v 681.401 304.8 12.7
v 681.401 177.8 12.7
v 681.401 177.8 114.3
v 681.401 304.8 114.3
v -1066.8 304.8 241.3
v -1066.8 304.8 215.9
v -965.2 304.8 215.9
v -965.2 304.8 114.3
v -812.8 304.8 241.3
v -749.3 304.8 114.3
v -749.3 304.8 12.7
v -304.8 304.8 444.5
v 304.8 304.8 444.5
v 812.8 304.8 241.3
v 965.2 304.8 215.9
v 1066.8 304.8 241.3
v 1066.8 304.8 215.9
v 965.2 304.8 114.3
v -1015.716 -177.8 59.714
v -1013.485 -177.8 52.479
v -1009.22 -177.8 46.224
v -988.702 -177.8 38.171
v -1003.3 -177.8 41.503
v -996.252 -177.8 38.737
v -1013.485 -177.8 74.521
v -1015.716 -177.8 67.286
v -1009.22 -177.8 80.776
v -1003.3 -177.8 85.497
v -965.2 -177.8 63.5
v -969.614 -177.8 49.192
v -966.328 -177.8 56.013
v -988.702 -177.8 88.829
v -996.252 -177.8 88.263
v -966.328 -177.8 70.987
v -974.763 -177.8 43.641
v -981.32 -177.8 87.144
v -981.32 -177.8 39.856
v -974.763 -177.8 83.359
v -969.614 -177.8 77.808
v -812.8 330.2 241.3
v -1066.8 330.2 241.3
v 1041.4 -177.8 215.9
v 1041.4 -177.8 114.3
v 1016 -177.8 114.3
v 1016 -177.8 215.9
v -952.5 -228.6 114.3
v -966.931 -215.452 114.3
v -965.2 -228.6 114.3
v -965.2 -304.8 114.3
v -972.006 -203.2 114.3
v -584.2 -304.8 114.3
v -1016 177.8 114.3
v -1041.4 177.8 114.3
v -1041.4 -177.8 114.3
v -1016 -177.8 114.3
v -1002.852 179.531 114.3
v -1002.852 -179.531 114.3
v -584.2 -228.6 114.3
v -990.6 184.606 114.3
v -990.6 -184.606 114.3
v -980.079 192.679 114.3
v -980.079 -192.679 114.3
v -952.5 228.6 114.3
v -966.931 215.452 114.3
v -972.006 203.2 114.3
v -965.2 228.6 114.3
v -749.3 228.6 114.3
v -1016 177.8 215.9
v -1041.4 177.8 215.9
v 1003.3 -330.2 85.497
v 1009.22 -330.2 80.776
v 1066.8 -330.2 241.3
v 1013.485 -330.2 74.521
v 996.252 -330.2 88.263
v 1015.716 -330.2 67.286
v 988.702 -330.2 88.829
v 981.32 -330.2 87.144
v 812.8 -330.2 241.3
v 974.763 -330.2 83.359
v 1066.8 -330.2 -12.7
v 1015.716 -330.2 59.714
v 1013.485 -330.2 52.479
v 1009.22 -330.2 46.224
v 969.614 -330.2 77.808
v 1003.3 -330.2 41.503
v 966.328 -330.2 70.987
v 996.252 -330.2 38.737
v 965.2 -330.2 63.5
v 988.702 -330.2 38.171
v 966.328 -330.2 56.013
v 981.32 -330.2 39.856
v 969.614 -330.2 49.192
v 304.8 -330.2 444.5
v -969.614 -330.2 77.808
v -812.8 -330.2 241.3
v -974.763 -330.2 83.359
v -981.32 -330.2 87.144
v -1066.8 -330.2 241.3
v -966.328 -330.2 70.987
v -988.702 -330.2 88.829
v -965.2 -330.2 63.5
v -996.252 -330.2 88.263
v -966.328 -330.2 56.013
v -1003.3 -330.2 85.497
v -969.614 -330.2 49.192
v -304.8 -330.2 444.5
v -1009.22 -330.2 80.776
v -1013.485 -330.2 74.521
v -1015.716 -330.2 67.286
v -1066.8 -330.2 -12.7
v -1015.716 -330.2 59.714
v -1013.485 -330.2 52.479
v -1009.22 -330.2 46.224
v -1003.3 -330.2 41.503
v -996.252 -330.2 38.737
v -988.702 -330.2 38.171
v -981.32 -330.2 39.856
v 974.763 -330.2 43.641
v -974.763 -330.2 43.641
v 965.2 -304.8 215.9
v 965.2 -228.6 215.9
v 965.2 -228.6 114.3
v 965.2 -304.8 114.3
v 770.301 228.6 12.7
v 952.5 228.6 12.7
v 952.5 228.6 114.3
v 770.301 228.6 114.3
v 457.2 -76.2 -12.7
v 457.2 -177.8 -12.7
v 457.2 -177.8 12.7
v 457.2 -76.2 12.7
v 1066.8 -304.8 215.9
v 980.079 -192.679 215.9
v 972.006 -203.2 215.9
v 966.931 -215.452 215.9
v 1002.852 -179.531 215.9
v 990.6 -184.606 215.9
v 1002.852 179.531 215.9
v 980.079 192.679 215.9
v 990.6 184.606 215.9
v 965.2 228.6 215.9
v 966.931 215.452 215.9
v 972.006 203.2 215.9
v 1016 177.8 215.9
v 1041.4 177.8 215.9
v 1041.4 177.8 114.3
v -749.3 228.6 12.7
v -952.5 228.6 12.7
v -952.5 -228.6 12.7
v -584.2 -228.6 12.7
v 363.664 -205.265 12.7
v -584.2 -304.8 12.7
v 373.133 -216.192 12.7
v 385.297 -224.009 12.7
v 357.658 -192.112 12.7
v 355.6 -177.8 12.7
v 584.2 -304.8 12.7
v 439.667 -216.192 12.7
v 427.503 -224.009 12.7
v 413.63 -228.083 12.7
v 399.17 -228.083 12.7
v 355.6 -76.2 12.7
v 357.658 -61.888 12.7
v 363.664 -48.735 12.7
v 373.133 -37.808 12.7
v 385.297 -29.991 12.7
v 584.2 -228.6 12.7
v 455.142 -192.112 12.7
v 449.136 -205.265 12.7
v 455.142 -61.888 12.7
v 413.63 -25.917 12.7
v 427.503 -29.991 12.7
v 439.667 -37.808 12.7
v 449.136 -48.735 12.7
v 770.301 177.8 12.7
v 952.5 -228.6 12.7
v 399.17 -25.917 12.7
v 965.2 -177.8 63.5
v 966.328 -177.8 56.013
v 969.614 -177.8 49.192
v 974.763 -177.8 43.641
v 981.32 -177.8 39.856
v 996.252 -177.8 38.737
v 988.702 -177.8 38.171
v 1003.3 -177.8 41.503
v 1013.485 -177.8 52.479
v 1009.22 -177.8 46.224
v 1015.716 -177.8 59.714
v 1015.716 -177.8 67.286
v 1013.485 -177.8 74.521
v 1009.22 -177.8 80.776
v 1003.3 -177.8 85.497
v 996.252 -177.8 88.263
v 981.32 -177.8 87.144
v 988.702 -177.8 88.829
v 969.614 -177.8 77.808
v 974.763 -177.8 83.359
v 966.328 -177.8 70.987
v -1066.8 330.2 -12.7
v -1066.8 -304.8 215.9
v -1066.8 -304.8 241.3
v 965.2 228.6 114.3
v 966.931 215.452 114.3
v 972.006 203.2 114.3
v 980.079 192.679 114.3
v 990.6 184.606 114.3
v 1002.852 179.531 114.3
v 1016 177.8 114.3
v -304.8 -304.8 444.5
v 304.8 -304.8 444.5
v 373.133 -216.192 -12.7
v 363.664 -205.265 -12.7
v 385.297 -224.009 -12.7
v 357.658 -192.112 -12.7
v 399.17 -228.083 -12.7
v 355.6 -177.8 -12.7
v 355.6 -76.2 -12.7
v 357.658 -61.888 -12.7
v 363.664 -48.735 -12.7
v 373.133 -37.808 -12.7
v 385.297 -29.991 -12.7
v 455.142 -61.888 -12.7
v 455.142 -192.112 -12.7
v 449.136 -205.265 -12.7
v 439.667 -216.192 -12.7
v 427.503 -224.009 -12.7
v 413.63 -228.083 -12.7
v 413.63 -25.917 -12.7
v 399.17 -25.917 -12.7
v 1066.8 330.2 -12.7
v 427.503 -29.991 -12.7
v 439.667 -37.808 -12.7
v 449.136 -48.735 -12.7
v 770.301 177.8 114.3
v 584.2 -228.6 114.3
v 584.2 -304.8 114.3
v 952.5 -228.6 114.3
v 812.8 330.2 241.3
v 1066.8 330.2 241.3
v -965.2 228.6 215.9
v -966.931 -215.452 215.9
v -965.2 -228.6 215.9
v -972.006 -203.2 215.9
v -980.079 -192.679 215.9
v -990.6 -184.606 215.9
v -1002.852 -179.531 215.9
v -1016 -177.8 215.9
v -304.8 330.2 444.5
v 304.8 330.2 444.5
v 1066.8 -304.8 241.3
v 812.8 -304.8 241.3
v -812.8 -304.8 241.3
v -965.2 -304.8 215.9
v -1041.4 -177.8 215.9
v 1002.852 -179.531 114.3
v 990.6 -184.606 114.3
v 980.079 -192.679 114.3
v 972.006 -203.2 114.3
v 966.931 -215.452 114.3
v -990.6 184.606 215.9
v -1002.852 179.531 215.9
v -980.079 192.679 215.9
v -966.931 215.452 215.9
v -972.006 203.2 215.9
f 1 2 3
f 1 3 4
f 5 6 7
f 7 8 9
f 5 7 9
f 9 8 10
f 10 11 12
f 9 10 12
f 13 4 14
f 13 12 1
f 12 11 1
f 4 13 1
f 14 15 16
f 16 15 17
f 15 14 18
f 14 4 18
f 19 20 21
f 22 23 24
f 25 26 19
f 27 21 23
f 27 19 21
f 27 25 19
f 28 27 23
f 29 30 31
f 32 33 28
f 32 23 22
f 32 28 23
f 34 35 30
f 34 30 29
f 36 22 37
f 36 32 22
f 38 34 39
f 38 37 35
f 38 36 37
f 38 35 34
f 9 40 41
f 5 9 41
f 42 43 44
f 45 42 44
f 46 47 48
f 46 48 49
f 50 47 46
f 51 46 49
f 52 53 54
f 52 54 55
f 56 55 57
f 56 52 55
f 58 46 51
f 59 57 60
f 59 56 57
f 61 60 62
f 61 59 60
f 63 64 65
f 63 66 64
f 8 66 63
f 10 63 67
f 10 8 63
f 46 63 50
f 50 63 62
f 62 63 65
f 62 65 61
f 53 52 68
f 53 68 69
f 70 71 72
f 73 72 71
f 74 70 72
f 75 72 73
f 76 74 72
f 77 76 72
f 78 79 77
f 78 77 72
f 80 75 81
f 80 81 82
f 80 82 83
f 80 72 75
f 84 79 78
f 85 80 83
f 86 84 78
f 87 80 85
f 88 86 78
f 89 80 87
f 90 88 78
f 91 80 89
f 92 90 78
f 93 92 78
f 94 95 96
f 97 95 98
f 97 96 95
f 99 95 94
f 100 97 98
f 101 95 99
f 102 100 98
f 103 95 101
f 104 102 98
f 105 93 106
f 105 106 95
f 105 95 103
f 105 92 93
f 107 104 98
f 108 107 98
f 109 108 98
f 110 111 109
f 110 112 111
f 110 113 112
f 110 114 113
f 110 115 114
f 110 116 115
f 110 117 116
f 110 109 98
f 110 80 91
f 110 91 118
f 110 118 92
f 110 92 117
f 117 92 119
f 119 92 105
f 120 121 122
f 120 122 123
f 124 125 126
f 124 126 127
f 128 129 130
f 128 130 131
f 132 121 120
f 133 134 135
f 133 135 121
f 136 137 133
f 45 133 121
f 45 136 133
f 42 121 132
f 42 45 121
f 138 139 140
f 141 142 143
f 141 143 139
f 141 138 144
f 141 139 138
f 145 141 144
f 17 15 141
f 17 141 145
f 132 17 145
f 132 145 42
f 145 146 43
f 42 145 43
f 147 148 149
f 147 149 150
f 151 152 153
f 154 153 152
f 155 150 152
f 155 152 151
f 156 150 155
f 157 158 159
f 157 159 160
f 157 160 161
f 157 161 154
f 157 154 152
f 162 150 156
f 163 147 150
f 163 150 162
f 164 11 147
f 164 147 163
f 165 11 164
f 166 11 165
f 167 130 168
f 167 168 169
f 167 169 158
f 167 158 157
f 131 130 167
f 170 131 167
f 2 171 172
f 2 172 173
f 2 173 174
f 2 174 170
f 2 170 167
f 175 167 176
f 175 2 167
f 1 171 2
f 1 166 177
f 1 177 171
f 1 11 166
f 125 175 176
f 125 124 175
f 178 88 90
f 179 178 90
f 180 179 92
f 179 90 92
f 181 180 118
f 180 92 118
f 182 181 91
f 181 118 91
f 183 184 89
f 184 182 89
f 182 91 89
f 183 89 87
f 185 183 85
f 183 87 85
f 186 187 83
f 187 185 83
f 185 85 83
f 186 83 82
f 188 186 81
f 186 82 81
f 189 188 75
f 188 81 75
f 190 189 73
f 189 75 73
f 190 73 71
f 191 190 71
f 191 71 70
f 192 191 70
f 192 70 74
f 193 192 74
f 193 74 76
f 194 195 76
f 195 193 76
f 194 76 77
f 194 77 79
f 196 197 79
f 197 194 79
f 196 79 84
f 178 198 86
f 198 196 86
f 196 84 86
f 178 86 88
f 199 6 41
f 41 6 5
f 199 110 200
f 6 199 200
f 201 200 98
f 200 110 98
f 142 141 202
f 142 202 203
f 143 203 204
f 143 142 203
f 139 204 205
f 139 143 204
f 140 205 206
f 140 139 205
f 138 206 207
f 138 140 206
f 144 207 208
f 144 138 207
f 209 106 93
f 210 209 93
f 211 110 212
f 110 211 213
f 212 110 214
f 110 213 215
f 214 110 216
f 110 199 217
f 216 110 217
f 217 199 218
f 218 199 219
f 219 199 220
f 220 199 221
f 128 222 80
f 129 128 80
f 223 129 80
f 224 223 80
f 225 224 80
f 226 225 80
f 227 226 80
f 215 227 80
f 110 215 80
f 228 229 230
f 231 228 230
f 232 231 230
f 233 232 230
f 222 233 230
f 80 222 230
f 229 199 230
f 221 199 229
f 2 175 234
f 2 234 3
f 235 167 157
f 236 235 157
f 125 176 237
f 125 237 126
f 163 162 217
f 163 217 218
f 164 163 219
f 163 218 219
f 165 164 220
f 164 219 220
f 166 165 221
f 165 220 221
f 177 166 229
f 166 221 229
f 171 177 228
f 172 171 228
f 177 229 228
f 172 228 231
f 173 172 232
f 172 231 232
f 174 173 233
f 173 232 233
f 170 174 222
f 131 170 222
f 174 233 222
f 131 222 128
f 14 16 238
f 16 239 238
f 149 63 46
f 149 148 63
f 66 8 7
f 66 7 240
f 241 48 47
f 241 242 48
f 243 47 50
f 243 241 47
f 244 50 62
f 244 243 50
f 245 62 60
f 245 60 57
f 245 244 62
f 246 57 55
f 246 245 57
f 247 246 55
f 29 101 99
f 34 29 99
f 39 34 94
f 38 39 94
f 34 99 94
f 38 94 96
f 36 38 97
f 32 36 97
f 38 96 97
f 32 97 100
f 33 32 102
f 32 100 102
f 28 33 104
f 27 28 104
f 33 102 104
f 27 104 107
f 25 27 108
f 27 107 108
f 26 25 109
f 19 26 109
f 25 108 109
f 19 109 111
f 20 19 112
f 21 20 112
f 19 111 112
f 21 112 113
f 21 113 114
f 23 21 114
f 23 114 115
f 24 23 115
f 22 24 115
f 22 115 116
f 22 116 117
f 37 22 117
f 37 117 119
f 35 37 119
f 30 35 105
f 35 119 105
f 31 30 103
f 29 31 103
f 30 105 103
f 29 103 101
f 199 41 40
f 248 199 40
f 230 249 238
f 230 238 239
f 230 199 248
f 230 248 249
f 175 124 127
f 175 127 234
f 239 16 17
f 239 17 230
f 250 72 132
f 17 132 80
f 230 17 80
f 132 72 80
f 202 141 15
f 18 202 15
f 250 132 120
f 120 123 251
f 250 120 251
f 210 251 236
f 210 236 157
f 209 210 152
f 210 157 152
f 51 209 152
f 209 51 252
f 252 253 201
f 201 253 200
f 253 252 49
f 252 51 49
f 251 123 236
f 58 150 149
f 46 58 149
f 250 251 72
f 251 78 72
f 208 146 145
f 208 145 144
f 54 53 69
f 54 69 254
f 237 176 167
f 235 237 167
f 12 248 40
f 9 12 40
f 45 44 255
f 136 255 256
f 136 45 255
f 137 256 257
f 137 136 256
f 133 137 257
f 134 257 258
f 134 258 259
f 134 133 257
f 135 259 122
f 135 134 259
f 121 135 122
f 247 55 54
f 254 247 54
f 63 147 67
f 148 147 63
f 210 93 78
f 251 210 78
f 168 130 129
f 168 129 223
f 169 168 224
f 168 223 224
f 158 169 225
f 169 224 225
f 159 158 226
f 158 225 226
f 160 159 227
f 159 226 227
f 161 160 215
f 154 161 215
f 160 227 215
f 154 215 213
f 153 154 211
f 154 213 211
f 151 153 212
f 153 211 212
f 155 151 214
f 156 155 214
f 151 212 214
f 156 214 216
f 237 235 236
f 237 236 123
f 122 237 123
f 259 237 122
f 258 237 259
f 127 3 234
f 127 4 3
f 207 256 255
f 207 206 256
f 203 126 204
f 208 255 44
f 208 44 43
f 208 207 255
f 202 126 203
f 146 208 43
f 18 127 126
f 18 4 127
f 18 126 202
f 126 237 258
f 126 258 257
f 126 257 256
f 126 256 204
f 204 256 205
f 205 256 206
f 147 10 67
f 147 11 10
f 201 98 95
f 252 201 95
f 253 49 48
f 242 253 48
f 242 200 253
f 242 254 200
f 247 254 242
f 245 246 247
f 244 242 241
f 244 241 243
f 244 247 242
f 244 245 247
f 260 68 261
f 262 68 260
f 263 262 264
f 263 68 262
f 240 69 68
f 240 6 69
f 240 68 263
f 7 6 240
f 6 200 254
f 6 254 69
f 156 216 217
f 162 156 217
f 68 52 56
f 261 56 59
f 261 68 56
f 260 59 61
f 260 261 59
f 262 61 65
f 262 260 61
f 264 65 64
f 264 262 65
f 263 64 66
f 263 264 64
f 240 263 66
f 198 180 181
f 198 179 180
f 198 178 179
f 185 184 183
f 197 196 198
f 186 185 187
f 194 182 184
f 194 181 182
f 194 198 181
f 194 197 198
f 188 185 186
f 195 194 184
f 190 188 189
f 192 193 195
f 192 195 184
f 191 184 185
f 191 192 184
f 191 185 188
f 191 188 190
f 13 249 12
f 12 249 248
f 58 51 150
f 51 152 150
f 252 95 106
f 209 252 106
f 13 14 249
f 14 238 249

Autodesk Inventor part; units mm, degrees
ref_plane "YZ Plane" through (0, 0, 0) normal (1, 0, 0) x (0, 1, 0)
ref_plane "XZ Plane" through (0, 0, 0) normal (0, 1, 0) x (-1, 0, 0)
ref_plane "XY Plane" through (0, 0, 0) normal (0, 0, 1) x (1, 0, 0)
sketch "Sketch1" plane through (0, 0, 0) normal (0, 0, 1) x (1, 0, 0)
  line L0 (-1066.8, 304.8) -> (1066.8, 304.8)
  line L1 (1066.8, 304.8) -> (1066.8, -304.8)
  line L2 (1066.8, -304.8) -> (-1066.8, -304.8)
  line L3 (-1066.8, -304.8) -> (-1066.8, 304.8)
  point P0 (0, 0)
  point P1 (1066.8, 0)
  point P2 (0, 304.8)
  dimension "d0" = 2133.6
  dimension "d1" = 609.6
extrude "Extrusion1" add sketch "Sketch1" along normal mid plane 25.4
sketch "Sketch3" plane through (0, 0, 12.7) normal (0, 0, 1) x (1, 0, 0)
  line L0 (-1066.8, -304.8) -> (-1066.8, 304.8) projected
  line L1 (1066.8, -304.8) -> (-1066.8, -304.8) projected
  line L2 (-1066.8, 304.8) -> (-1041.4, 304.8)
  line L3 (-1041.4, 304.8) -> (-1041.4, -304.8)
  line L4 (-1041.4, -304.8) -> (-1066.8, -304.8)
  line L5 (-1066.8, -304.8) -> (-1066.8, 304.8)
  line L6 (1066.8, 304.8) -> (1041.4, 304.8)
  line L7 (1041.4, 304.8) -> (1041.4, -304.8)
  line L8 (1041.4, -304.8) -> (1066.8, -304.8)
  line L9 (1066.8, -304.8) -> (1066.8, 304.8)
  point P0 (0, 0)
  dimension "d18" = 25.4
  dimension "d19" = 25.4
extrude "Extrusion3" add sketch "Sketch3" along normal blind 203.2
sketch "Sketch5" plane through (0, 0, 0) normal (0, 1, 0) x (-1, 0, 0)
  line L0 (-1041.4, 12.7) -> (1041.4, 12.7) projected
  point P0 (0, 0)
  point P1 (787.4, 12.7)
sketch "Sketch6" plane through (0, 0, 12.7) normal (0, 0, 1) x (1, 0, 0)
  line L0 (-1041.4, 304.8) -> (-1041.4, -304.8) projected
  line L1 (-1041.4, 304.8) -> (-965.2, 304.8)
  line L2 (-965.2, 304.8) -> (-965.2, 177.8)
  line L3 (-965.2, 177.8) -> (-1041.4, 177.8)
  line L4 (-1041.4, 177.8) -> (-1041.4, 304.8)
  line L5 (-1041.4, -304.8) -> (-965.2, -304.8)
  line L6 (-965.2, -304.8) -> (-965.2, -177.8)
  line L7 (-965.2, -177.8) -> (-1041.4, -177.8)
  line L8 (-1041.4, -177.8) -> (-1041.4, -304.8)
  point P0 (0, 0)
  dimension "d30" = 76.2
  dimension "d31" = 127
  dimension "d32" = 127
  dimension "d33" = 76.2
extrude "Extrusion5" add sketch "Sketch6" along normal blind 203.2
mirror "Mirror1" about plane through (0, 0, 0) normal (1, 0, 0) of "Extrusion5"
fillet "Fillet1" radius 50.8 4 edges at (-965.2, 177.8, 114.3) (965.2, 177.8, 114.3) (965.2, -177.8, 114.3) (-965.2, -177.8, 114.3)
sketch "Sketch14" plane through (0, 0, -12.7) normal (0, 0, -1) x (-1, 0, 0)
  line L0 (-1066.8, 304.8) -> (1066.8, 304.8)
  line L1 (1066.8, 304.8) -> (1066.8, 330.2)
  line L2 (1066.8, 330.2) -> (-1066.8, 330.2)
  line L3 (-1066.8, 330.2) -> (-1066.8, 304.8)
  line L4 (1066.8, -304.8) -> (-1066.8, -304.8)
  line L5 (-1066.8, -304.8) -> (-1066.8, -330.2)
  line L6 (-1066.8, -330.2) -> (1066.8, -330.2)
  line L7 (1066.8, -330.2) -> (1066.8, -304.8)
  point P0 (0, 0)
  dimension "d62" = 25.4
  dimension "d63" = 25.4
extrude "Extrusion11" add sketch "Sketch14" against normal blind 228.6
sketch "Sketch15" plane through (-1066.8, 330.2, -12.7) normal (0, 1, 0) x (1, 0, 0)
  line L0 (2133.6, 0) -> (2133.6, -228.6) projected
  line L1 (2133.6, -228.6) -> (2133.6, -254)
  line L2 (2133.6, -254) -> (1879.6, -254)
  line L3 (1879.6, -254) -> (1371.6, -457.2)
  line L4 (1371.6, -457.2) -> (762, -457.2)
  line L5 (762, -457.2) -> (254, -254)
  line L6 (254, -254) -> (0, -254)
  line L7 (0, -254) -> (0, -228.6)
  line L8 (0, -228.6) -> (2133.6, -228.6)
  point P0 (1066.8, -12.7)
  dimension "d66" = 254
  dimension "d67" = 508
  dimension "d68" = 609.6
  dimension "d69" = 508
  dimension "d70" = 254
  dimension "d71" = 228.6
  dimension "d72" = 25.4
  dimension "d73" = 25.4
extrude "Extrusion12" add sketch "Sketch15" against normal blind 25.4
mirror "Mirror4" about plane through (0, 0, 0) normal (0, 1, 0) of "Extrusion12"
sketch "Sketch16" plane through (0, 0, -12.7) normal (0, 0, -1) x (-1, 0, 0)
  line L0 (-457.2, -177.8) -> (-457.2, -76.2)
  line L1 (-355.6, -177.8) -> (-355.6, -76.2)
  arc A0 (-355.6, -76.2) -> (-457.2, -76.2) centre (-406.4, -76.2) ccw
  arc A1 (-457.2, -177.8) -> (-355.6, -177.8) centre (-406.4, -177.8) ccw
  line L2 (-1066.8, 330.2) -> (-1066.8, -330.2) projected
  line L3 (-1066.8, -330.2) -> (1066.8, -330.2) projected
  point P0 (0, 0)
  dimension "d76" = 101.6
  dimension "d77" = 609.6
  dimension "d78" = 152.4
  dimension "d79" = 101.6
extrude "Extrusion13" cut sketch "Sketch16" against normal blind 25.4
sketch "Sketch20" plane through (0, 0, 12.7) normal (0, 0, 1) x (1, 0, 0)
  line L0 (-965.2, 304.8) -> (-1066.8, 304.8) projected
  line L1 (-1041.4, 304.8) -> (-749.3, 304.8)
  line L2 (-749.3, 304.8) -> (-749.3, 228.6)
  line L3 (-749.3, 228.6) -> (-1041.4, 228.6)
  line L4 (-1041.4, 228.6) -> (-1041.4, 304.8)
  line L5 (-965.2, -304.8) -> (-1028.7, -304.8) projected
  line L6 (-1016, -304.8) -> (-584.2, -304.8)
  line L7 (-584.2, -304.8) -> (-584.2, -228.6)
  line L8 (-584.2, -228.6) -> (-1016, -228.6)
  line L9 (-1016, -228.6) -> (-1016, -304.8)
  point P0 (0, 0)
  dimension "d106" = 431.8
extrude "Extrusion16" add sketch "Sketch20" along normal blind 101.6
mirror "Mirror5" about plane through (0, 0, 0) normal (1, 0, 0) of "Extrusion16"
sketch "Sketch21" plane through (0, 0, 12.7) normal (0, 0, 1) x (1, 0, 0)
  line L0 (812.8, 304.8) -> (304.8, 304.8) projected
  line L1 (681.4009, 304.8) -> (770.3009, 304.8)
  line L2 (770.3009, 304.8) -> (770.3009, 177.8)
  line L3 (770.3009, 177.8) -> (681.4009, 177.8)
  line L4 (681.4009, 177.8) -> (681.4009, 304.8)
  point P0 (0, 0)
  dimension "d91" = 127
  dimension "d92" = 88.9
extrude "Extrusion17" add sketch "Sketch21" along normal blind 101.6
sketch "Sketch22" plane through (0, 0, 12.7) normal (0, 0, 1) x (1, 0, 0)
  line L0 (-812.8, 304.8) -> (-1066.8, 304.8) projected
  line L1 (-812.8, -304.8) -> (-1066.8, -304.8) projected
  line L2 (-1041.4, 304.8) -> (-952.5, 304.8)
  line L3 (-952.5, 304.8) -> (-952.5, -304.8)
  line L4 (-952.5, -304.8) -> (-1041.4, -304.8)
  line L5 (-1041.4, -304.8) -> (-1041.4, 304.8)
  line L6 (-1041.4, -177.8) -> (-1041.4, 177.8) projected
  point P0 (0, 0)
  dimension "d97" = 88.9
  dimension "d98" = 0
extrude "Extrusion18" add sketch "Sketch22" along normal blind 101.6
mirror "Mirror7" about plane through (0, 0, 0) normal (1, 0, 0) of "Extrusion18"
sketch "Sketch23" plane through (-1066.8, -330.2, -12.7) normal (0, -1, 0) x (1, 0, 0)
  circle A0 centre (76.2, 76.2) radius 25.4
  line L0 (0, 0) -> (0, 254) projected
  line L1 (2133.6, 0) -> (0, 0) projected
  point P0 (1066.8, 12.7)
  dimension "d101" = 50.8
  dimension "d102" = 76.2
  dimension "d103" = 76.2
extrude "Extrusion19" cut sketch "Sketch23" against normal blind 152.4
mirror "Mirror8" about plane through (0, 0, 0) normal (1, 0, 0) of "Extrusion19"
properties part number "Cam_support"
